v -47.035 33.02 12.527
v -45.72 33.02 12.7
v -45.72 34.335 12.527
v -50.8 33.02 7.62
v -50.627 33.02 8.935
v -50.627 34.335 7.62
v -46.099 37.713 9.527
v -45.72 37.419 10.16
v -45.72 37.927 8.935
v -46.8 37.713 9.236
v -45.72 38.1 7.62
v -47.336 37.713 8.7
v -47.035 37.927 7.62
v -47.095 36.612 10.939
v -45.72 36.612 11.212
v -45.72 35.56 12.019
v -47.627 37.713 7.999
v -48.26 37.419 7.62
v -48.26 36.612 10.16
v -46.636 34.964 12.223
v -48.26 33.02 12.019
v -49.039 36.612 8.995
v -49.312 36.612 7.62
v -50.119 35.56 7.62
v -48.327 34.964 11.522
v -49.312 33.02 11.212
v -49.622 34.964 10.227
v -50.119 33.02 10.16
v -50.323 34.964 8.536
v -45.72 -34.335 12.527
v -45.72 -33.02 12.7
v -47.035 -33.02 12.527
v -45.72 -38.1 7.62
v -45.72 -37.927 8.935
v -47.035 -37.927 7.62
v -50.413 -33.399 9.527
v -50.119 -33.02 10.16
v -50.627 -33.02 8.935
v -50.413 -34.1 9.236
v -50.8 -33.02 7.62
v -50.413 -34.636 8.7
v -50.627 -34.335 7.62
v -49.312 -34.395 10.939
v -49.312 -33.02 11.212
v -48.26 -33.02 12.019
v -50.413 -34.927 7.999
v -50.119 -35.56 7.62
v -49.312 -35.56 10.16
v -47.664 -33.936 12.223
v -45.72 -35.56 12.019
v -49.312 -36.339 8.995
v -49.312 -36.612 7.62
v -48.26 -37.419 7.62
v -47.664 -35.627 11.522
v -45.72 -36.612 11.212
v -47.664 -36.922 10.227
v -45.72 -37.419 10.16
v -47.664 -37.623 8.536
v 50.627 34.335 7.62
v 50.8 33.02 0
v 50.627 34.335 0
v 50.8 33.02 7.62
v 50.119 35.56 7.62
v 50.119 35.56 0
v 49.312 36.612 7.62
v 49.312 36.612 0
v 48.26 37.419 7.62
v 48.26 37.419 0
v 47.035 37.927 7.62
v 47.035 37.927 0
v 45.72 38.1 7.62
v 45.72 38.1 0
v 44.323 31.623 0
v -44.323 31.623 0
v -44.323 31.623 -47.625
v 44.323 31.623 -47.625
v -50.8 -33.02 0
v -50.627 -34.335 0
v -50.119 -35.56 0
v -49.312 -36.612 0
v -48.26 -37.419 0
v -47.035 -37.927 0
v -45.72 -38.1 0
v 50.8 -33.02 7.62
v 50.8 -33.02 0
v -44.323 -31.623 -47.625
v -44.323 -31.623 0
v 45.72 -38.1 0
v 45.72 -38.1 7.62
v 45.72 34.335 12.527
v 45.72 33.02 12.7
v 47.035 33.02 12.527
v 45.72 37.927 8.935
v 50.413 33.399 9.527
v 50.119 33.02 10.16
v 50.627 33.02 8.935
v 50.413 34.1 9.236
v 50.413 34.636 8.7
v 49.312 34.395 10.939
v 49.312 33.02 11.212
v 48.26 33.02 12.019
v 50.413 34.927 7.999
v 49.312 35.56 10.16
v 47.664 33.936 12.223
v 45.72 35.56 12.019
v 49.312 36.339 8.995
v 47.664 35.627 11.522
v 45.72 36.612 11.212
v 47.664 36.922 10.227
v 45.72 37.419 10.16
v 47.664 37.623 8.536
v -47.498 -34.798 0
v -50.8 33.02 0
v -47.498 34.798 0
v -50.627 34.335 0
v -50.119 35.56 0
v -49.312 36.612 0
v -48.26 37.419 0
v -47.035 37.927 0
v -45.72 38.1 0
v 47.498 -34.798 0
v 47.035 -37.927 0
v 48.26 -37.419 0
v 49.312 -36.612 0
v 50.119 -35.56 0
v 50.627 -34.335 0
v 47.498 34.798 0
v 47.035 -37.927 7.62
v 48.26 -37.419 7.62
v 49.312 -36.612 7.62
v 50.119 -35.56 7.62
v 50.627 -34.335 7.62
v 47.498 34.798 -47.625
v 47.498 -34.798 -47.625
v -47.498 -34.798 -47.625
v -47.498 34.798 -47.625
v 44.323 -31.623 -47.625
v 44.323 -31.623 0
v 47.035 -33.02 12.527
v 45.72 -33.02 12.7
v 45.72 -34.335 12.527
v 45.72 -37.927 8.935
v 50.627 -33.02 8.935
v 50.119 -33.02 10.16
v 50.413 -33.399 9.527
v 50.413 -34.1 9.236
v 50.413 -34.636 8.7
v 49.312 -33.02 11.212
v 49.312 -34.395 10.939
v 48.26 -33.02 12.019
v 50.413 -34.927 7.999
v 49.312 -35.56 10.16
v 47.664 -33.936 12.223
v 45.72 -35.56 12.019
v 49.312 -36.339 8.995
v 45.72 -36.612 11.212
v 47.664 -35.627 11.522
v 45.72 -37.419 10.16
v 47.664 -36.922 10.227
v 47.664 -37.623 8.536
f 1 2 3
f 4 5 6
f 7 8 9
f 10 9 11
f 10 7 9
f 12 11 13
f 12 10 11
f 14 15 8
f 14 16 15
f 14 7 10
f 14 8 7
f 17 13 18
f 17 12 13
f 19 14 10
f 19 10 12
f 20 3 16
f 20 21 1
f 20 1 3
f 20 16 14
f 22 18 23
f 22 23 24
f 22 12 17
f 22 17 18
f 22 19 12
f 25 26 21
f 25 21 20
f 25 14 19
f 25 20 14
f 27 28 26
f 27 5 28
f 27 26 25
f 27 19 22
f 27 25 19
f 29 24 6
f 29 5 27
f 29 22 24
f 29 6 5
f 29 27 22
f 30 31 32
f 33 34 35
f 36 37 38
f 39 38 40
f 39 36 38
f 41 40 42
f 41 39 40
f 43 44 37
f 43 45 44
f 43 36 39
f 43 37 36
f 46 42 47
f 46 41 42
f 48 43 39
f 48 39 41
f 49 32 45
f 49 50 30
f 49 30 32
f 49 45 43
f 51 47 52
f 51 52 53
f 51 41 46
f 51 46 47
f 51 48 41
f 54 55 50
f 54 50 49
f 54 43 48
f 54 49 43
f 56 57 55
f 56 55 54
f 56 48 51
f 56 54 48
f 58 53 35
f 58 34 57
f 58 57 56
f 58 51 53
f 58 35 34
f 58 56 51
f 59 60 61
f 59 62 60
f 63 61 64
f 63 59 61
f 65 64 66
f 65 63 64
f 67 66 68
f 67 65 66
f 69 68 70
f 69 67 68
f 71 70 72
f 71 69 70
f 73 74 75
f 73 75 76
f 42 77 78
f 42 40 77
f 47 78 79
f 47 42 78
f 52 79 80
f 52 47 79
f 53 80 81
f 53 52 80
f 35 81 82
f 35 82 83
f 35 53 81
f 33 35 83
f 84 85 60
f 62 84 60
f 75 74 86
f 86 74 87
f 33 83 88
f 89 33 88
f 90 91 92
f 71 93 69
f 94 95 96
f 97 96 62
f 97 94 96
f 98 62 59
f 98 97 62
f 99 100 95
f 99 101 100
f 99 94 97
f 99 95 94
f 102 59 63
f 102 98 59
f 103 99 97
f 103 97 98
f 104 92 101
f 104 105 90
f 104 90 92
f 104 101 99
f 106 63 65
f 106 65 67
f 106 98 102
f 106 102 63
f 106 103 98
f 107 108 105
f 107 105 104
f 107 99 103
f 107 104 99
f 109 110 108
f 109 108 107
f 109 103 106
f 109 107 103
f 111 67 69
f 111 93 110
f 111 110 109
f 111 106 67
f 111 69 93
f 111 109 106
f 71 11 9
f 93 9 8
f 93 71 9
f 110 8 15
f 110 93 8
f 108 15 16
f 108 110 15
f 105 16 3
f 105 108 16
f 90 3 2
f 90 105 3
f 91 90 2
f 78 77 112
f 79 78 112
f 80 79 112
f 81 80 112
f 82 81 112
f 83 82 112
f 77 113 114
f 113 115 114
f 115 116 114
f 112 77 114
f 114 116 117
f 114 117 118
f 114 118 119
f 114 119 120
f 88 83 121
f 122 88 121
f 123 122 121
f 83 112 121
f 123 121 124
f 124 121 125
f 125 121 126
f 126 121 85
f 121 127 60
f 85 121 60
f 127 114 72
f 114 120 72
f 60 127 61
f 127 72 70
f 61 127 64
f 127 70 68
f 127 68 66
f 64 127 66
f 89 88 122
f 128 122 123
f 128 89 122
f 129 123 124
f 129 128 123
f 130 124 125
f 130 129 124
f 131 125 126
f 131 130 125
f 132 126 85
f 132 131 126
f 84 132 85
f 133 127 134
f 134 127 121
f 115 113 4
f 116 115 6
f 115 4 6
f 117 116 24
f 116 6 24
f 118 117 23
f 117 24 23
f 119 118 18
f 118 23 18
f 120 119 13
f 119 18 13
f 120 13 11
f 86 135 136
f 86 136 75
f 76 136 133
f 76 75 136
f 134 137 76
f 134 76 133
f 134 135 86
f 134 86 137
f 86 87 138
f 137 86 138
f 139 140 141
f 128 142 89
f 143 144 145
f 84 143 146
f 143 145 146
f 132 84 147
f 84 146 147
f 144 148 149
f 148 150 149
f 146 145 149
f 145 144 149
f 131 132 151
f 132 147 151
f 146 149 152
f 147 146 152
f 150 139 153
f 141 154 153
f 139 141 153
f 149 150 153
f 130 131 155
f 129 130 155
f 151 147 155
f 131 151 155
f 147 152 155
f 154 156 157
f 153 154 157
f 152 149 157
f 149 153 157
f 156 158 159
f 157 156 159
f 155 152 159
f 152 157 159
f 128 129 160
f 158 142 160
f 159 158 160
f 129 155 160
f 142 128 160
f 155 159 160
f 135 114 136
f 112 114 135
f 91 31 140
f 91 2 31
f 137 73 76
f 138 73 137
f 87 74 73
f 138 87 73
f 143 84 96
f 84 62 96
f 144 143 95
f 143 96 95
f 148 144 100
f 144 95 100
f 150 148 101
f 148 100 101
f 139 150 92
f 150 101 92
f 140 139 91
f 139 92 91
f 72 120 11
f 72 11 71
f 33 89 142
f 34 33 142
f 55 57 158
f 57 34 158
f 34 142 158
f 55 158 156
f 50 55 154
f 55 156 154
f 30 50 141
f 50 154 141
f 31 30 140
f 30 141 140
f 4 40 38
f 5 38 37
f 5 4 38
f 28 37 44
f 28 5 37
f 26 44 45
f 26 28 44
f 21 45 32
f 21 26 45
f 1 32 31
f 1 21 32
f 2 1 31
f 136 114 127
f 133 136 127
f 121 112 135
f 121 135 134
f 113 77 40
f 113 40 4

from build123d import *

# Parameters (mm, degrees)
F0_W     = 101.6
F0_H     = 76.2
F1_DEPTH = 12.7
F2_R     = 5.08
F3_W     = 94.996
F3_H     = 69.596
F3_W_2   = 88.646
F3_H_2   = 63.246
F4_DEPTH = 47.625


with BuildPart() as f1:
    # F0 (on Top) → F1 (new body)
    with BuildSketch(Plane.XY):
        Rectangle(F0_W, F0_H)
    extrude(amount=F1_DEPTH)

    # F2
    f2_edges = [f1.edges().sort_by_distance(p)[0] for p in [
        (0, -38.1, 12.7),
        (-50.8, 0, 12.7),
        (0, 38.1, 12.7),
        (50.8, 0, 12.7),
        (50.8, -38.1, 6.35),
        (50.8, 38.1, 6.35),
        (-50.8, 38.1, 6.35),
        (-50.8, -38.1, 6.35),
    ]]
    fillet(f2_edges, radius=F2_R)

    # F3 (on face) → F4 (join)
    with BuildSketch(Plane(origin=(0, 0, 0), x_dir=(1, 0, 0), z_dir=(0, 0, -1))):
        Rectangle(F3_W, F3_H)
        Rectangle(F3_W_2, F3_H_2, mode=Mode.SUBTRACT)
    extrude(amount=F4_DEPTH)


solid = f1.part
